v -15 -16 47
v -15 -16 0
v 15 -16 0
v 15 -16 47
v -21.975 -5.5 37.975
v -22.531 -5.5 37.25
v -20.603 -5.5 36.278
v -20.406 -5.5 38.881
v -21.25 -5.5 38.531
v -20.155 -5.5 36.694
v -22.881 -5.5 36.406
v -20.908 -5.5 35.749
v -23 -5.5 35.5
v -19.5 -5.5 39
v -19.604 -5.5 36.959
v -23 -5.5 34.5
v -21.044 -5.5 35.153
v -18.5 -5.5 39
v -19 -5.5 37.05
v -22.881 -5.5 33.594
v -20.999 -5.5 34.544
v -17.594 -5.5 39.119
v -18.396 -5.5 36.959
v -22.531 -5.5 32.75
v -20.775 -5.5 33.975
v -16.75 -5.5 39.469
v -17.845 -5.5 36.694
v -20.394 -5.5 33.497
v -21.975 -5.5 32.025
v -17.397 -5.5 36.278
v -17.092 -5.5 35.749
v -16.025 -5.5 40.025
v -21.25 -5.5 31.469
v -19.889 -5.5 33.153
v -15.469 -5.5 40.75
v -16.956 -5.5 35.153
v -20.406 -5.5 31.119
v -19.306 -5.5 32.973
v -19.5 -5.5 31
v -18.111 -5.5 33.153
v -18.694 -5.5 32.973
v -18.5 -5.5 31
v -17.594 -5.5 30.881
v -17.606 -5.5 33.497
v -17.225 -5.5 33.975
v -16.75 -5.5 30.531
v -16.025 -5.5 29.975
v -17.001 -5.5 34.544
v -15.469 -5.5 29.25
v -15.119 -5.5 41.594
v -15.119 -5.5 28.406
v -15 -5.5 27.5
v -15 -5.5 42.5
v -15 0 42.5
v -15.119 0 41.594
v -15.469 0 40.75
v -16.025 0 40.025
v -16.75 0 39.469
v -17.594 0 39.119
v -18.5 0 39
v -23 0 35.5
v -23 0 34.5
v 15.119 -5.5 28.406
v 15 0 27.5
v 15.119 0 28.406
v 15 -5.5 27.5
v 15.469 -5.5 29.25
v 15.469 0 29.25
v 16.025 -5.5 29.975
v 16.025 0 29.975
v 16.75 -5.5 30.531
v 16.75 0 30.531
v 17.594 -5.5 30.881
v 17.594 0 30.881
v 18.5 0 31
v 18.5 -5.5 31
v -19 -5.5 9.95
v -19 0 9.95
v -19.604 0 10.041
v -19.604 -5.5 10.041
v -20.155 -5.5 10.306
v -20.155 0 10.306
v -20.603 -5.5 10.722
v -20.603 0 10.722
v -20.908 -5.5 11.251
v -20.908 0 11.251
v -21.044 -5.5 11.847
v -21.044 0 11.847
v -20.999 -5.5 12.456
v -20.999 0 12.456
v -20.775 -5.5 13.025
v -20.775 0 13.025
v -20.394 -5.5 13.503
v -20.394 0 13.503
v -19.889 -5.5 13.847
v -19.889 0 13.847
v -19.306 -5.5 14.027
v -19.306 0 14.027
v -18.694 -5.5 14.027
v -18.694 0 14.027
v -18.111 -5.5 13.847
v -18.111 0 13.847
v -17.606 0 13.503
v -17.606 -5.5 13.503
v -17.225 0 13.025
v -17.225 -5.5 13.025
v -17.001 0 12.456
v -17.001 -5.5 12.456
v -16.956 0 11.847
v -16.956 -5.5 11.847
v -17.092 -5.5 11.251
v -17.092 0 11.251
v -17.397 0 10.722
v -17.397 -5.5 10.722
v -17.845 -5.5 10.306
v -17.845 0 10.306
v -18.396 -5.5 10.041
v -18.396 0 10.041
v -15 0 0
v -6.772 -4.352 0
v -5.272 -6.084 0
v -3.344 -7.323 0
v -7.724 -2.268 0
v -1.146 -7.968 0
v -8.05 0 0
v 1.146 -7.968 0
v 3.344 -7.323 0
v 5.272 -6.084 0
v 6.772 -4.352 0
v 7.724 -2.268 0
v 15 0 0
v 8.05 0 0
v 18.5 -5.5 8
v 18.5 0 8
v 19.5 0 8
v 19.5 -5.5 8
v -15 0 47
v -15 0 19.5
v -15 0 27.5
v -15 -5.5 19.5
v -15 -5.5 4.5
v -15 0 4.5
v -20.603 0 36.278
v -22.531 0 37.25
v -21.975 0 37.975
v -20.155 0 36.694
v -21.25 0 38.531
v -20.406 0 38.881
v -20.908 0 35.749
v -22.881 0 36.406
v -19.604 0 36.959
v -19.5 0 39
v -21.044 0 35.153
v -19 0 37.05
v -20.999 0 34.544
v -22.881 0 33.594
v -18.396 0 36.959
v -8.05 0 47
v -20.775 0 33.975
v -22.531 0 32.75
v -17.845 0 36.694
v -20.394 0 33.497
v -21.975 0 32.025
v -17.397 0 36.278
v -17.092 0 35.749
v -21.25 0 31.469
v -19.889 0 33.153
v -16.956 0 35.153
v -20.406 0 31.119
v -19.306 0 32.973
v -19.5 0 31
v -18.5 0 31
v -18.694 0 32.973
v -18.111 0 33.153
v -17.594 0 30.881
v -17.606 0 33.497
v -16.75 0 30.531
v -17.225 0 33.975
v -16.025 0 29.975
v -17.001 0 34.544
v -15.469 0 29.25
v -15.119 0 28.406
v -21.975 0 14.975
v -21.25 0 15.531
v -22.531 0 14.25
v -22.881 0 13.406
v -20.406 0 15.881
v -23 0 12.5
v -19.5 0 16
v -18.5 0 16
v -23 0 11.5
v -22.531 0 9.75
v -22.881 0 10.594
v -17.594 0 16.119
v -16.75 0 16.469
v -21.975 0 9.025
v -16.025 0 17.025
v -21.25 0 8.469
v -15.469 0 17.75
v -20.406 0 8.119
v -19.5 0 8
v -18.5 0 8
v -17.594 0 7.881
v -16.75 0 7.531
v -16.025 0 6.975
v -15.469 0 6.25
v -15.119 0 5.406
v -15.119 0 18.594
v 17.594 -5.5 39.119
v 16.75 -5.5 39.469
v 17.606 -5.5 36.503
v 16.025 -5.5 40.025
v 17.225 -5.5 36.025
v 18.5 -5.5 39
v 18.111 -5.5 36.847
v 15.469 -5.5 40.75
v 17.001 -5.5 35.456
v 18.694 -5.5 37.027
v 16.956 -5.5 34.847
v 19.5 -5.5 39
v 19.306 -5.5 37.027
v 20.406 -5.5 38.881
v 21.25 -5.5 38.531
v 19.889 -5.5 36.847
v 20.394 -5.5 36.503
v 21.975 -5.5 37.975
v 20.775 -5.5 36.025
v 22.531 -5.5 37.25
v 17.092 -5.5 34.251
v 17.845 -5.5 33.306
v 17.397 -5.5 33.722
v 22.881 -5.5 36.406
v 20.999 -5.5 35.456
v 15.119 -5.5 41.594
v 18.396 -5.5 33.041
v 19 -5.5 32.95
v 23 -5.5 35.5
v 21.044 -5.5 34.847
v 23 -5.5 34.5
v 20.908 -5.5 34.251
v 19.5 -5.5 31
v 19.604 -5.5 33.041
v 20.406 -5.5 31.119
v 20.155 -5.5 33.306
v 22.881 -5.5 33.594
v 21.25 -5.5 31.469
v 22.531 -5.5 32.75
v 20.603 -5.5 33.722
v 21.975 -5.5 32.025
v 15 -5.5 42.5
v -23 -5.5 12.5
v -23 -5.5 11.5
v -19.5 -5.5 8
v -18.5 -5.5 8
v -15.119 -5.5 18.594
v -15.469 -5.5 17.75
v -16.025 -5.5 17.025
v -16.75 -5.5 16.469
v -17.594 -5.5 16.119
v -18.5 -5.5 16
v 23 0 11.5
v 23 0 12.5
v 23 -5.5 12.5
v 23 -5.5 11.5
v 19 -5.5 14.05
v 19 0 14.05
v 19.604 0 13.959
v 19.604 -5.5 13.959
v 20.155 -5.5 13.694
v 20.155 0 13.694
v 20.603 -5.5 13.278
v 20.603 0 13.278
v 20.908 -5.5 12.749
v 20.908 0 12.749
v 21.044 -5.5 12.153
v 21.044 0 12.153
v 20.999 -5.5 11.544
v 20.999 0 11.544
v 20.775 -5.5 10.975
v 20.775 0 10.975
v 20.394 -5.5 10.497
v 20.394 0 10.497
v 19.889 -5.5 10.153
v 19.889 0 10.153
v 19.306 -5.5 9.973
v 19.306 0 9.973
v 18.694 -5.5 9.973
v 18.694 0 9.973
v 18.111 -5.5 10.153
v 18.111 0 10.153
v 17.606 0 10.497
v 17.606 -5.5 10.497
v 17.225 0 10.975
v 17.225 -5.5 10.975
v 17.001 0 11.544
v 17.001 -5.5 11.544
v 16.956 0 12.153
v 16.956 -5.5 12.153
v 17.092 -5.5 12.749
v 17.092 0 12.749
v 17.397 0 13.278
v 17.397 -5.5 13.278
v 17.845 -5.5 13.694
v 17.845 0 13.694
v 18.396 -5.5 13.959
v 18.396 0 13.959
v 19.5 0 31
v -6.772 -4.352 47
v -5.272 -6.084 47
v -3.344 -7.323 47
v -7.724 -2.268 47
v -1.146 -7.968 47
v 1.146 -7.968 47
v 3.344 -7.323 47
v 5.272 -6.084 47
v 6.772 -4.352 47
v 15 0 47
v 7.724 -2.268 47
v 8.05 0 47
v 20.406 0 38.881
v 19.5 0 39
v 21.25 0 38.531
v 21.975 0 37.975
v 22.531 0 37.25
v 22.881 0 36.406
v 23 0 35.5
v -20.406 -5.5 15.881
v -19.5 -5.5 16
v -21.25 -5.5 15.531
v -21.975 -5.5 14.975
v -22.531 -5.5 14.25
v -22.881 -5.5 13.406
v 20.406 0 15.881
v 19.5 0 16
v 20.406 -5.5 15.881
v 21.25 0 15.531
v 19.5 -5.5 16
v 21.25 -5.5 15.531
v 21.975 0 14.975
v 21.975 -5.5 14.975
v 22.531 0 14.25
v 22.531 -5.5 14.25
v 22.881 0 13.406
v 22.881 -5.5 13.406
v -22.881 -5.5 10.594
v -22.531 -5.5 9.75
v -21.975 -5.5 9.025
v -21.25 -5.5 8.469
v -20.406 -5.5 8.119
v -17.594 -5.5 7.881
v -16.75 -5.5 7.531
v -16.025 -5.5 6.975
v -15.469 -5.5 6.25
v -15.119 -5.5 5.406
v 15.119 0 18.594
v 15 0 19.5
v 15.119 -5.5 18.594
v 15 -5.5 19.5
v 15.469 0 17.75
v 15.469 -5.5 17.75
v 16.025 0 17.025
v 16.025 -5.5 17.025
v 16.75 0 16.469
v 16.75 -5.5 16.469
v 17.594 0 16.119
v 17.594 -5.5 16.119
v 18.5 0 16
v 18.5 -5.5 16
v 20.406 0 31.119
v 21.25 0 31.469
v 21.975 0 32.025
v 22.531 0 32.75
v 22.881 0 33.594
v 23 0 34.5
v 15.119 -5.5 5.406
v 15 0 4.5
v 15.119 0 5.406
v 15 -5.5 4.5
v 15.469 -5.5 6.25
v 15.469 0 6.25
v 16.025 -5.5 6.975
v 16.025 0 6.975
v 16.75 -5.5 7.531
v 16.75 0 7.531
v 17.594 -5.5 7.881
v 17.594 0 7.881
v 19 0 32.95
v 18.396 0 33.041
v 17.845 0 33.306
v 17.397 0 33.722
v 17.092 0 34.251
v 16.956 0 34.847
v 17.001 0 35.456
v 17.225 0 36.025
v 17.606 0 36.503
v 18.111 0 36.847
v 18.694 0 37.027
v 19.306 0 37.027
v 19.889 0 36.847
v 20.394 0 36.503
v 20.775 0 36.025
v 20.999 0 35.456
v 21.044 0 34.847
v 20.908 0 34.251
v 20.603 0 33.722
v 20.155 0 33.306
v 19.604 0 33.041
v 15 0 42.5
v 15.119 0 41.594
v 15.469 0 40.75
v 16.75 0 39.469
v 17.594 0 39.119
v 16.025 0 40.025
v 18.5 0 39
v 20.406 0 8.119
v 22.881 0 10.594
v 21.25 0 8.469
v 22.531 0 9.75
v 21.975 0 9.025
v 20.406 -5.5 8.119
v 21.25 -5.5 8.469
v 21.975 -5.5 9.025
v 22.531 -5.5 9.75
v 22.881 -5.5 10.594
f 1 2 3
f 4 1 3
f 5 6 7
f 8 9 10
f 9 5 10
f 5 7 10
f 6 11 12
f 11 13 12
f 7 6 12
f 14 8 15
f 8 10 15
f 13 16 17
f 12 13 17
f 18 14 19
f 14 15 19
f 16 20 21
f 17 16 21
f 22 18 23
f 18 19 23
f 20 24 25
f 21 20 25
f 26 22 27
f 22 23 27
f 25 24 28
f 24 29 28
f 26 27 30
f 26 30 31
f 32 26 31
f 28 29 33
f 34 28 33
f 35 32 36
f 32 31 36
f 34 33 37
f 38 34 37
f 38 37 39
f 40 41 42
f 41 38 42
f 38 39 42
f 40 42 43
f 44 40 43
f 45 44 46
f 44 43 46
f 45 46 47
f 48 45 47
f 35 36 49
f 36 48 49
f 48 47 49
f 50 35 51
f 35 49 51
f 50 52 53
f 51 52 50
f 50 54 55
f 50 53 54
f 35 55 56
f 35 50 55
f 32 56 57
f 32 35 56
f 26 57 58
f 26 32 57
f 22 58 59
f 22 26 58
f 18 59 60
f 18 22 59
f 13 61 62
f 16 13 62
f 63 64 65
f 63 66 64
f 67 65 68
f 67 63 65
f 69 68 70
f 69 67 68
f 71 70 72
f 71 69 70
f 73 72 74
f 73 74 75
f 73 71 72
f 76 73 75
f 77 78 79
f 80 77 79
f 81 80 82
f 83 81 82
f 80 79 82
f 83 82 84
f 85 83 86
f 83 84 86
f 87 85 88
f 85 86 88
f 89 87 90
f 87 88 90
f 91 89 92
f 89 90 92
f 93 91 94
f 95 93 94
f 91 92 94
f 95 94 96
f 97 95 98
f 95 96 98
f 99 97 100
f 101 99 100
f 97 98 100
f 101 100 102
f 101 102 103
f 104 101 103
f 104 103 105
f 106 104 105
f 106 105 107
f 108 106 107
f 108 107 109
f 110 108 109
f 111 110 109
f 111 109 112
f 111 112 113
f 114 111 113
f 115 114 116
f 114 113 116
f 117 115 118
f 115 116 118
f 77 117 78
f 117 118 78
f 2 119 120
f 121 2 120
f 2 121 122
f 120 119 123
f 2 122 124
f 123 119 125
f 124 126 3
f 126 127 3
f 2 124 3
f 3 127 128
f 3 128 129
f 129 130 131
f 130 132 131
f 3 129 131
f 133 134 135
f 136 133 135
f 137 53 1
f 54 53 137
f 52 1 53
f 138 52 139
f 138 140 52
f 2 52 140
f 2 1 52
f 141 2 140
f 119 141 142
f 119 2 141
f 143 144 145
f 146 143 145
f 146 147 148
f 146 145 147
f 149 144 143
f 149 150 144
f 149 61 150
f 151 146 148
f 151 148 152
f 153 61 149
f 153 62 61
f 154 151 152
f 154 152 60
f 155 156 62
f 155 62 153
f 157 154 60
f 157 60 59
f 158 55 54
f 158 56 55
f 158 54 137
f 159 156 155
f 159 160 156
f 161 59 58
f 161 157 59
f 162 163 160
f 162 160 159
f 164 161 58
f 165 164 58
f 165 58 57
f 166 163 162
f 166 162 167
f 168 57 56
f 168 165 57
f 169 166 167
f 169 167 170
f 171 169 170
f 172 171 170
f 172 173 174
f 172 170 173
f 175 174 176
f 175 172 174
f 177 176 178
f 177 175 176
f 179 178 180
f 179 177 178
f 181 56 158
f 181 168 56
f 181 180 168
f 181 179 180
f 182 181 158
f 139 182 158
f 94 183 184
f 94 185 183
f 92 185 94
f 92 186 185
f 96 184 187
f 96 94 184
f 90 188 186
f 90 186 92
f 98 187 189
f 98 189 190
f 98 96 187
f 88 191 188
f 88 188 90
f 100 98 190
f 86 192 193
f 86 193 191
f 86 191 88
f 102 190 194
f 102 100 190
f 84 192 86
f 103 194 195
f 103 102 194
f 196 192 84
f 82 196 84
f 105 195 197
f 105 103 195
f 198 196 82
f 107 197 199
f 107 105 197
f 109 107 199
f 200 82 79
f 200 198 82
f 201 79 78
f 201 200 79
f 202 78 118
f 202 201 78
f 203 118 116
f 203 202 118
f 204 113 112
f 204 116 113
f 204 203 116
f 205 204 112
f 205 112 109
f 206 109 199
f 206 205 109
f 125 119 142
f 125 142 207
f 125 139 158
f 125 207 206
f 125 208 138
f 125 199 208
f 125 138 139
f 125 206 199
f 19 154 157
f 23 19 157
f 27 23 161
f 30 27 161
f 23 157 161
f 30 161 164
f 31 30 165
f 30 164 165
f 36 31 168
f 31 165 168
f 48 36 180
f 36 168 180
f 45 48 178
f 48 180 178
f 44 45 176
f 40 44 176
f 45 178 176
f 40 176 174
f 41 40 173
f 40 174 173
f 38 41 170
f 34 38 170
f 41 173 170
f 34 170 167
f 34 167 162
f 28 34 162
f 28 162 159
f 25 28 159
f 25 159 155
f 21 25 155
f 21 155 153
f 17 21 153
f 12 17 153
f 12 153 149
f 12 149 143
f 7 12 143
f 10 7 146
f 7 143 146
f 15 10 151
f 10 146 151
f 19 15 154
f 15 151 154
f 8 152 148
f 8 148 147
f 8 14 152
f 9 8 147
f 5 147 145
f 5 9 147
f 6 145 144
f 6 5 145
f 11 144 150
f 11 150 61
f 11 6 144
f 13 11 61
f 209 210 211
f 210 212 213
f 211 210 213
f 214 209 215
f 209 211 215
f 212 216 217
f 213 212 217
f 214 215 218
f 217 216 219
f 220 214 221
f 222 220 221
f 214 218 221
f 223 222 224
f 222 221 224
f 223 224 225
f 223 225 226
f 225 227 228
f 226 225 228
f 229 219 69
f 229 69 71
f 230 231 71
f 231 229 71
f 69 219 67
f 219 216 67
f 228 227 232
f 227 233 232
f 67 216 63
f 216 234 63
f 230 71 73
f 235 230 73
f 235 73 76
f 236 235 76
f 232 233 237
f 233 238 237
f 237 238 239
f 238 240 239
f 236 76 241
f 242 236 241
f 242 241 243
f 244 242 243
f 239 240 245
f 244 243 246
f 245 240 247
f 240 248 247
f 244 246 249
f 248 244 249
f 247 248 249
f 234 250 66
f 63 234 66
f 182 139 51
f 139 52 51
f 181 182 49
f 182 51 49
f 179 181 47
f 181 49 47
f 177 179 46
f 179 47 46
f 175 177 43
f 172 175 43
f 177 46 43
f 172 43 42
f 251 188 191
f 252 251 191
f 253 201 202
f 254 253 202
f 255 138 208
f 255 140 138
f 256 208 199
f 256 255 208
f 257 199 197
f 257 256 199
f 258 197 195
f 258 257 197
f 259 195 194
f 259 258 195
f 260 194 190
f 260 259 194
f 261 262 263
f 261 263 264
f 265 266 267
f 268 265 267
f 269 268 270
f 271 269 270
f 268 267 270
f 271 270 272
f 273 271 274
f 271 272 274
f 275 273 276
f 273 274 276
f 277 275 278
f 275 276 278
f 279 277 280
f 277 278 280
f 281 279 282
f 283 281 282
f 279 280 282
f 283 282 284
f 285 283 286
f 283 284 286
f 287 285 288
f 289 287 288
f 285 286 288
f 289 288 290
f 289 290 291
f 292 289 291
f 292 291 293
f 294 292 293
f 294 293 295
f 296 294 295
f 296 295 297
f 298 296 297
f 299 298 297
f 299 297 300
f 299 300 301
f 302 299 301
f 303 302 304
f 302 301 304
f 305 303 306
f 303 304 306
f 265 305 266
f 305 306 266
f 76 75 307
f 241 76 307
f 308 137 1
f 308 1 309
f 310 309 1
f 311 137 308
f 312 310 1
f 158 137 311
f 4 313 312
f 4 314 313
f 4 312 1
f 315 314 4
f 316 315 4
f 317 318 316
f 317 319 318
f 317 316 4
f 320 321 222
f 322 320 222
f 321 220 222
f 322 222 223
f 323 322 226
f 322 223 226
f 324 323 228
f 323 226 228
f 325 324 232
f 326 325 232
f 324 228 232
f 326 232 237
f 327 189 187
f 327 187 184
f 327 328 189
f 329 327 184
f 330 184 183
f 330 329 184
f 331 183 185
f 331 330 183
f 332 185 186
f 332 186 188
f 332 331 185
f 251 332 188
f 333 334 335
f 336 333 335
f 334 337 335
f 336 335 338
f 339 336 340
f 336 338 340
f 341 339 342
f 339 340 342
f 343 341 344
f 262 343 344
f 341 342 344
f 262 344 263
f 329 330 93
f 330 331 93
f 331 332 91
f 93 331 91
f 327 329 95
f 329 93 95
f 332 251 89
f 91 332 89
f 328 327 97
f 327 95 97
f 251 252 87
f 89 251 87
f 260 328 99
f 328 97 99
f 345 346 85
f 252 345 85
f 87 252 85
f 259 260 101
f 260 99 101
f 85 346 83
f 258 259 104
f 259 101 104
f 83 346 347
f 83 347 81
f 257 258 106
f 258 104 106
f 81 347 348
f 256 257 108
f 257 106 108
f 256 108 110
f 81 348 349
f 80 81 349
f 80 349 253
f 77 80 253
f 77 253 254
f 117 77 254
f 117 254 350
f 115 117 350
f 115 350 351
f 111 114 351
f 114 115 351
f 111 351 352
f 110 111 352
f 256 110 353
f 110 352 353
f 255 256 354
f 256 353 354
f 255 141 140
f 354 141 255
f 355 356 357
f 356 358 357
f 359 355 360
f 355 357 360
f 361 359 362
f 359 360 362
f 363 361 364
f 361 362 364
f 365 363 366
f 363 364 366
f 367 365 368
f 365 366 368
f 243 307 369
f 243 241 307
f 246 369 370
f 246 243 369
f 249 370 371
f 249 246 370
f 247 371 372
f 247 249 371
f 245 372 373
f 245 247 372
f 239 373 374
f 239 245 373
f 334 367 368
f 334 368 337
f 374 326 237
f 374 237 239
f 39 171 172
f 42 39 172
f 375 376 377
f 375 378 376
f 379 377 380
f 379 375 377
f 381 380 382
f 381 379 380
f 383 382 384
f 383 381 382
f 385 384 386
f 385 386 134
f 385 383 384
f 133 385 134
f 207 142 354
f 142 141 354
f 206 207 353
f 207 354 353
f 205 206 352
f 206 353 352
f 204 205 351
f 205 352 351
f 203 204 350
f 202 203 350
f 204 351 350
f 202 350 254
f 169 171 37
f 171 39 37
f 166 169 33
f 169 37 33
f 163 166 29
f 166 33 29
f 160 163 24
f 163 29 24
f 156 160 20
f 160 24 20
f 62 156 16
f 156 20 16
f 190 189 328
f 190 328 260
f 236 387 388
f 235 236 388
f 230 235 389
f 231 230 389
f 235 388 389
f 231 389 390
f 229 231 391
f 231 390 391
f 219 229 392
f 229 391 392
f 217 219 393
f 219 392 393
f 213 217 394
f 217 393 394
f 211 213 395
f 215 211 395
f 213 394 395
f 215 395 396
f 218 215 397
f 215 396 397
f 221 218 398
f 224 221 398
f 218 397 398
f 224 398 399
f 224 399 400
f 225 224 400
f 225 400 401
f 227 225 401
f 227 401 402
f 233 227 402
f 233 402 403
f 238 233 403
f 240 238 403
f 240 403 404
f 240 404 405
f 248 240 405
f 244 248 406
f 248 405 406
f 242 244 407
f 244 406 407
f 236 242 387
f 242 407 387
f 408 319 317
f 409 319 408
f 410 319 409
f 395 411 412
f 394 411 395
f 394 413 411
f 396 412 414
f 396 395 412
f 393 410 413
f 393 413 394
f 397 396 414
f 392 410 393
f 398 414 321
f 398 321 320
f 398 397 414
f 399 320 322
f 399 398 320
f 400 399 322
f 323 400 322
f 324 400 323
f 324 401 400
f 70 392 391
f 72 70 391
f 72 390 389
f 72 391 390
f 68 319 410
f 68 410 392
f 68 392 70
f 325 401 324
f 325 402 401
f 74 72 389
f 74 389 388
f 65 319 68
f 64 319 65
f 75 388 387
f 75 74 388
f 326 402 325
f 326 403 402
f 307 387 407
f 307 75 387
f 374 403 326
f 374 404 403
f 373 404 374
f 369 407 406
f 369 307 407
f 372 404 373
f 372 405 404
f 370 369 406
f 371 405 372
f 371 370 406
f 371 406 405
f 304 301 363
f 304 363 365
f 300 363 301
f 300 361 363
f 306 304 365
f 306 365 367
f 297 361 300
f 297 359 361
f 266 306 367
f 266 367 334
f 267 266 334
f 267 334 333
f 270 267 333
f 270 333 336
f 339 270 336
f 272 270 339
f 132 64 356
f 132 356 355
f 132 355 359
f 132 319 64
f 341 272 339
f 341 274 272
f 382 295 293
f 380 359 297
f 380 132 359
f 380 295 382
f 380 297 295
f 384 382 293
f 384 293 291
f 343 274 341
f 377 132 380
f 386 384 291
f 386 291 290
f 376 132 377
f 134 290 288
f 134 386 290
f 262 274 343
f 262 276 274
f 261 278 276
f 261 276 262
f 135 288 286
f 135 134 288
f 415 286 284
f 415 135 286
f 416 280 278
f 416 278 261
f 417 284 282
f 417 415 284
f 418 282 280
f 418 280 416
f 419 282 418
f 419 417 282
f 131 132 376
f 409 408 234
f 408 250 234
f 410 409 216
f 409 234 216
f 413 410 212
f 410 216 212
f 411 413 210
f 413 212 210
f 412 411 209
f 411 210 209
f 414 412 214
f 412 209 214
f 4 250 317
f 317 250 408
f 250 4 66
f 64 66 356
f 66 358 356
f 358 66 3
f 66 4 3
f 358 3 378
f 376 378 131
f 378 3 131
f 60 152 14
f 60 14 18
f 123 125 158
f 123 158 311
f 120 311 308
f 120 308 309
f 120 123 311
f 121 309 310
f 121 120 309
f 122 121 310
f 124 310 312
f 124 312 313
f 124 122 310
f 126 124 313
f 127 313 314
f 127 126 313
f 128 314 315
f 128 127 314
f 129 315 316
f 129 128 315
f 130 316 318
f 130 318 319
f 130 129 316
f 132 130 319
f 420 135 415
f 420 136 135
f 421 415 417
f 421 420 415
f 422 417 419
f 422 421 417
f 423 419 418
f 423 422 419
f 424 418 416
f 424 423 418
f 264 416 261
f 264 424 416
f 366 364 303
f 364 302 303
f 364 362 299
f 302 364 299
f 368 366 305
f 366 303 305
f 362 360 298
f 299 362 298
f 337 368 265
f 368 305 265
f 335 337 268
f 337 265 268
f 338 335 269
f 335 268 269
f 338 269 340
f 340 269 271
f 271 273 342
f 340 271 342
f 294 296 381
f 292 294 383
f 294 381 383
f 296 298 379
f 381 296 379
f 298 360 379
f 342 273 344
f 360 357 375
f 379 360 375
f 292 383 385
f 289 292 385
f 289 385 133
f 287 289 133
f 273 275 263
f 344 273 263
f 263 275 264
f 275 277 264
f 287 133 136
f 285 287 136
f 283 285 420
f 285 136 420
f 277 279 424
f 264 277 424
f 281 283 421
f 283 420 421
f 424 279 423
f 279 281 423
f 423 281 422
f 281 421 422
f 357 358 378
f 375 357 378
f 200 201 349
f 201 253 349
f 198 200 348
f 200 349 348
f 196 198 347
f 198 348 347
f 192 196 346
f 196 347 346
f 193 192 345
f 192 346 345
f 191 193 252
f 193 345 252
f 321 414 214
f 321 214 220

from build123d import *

# Parameters (mm, degrees)
SKETCH1_W               = 30
SKETCH1_H               = 32
SKETCH1_R               = 8.05
BOSS_EXTRUDE1_DEPTH     = 47
CUT_EXTRUDE1_DEPTH      = 52.86520992
CUT_EXTRUDE1_DEPTH_BACK = 52.86520992
SKETCH3_W               = 30
SKETCH3_H               = 16
SKETCH4_W               = 8
SKETCH4_H               = 8
SKETCH4_R               = 2.05
BOSS_EXTRUDE2_DEPTH     = 5.5
FILLET1_R               = 3.5


with BuildPart() as part:
    # Sketch1 → Boss-Extrude1 (new body)
    with BuildSketch(Plane.XY):
        Rectangle(SKETCH1_W, SKETCH1_H)
        Circle(SKETCH1_R, mode=Mode.SUBTRACT)
    extrude(amount=BOSS_EXTRUDE1_DEPTH)

    # Sketch3 → Cut-Extrude1 (cut, two sides: drawn at the far end of the back side and taken through both)
    with BuildSketch(Plane.XY.offset(-CUT_EXTRUDE1_DEPTH_BACK)):
        with Locations((0, 8)):
            Rectangle(SKETCH3_W, SKETCH3_H)
    extrude(amount=CUT_EXTRUDE1_DEPTH + CUT_EXTRUDE1_DEPTH_BACK, mode=Mode.SUBTRACT)

    # Sketch4 → Boss-Extrude2 (add)
    # profile 1 of 4: a face of its own
    with BuildSketch(Plane(origin=(0, 0, 0), x_dir=(1, 0, 0), z_dir=(0, 1, 0))):
        with Locations((19, -12)):
            Rectangle(SKETCH4_W, SKETCH4_H)
        with Locations(Location((19, -12, 0), (0, 0, 270))):
            Circle(SKETCH4_R, mode=Mode.SUBTRACT)
    # profile 2 of 4: a face of its own
    with BuildSketch(Plane(origin=(0, 0, 0), x_dir=(1, 0, 0), z_dir=(0, 1, 0))):
        with Locations((-19, -35)):
            Rectangle(SKETCH4_W, SKETCH4_H)
        with Locations(Location((-19, -35, 0), (0, 0, 270))):
            Circle(SKETCH4_R, mode=Mode.SUBTRACT)
    # profile 3 of 4: a face of its own
    with BuildSketch(Plane(origin=(0, 0, 0), x_dir=(1, 0, 0), z_dir=(0, 1, 0))):
        with Locations((19, -35)):
            Rectangle(SKETCH4_W, SKETCH4_H)
        with Locations(Location((19, -35, 0), (0, 0, 90))):
            Circle(SKETCH4_R, mode=Mode.SUBTRACT)
    # profile 4 of 4: a face of its own
    with BuildSketch(Plane(origin=(0, 0, 0), x_dir=(1, 0, 0), z_dir=(0, 1, 0))):
        with Locations((-19, -12)):
            Rectangle(SKETCH4_W, SKETCH4_H)
        with Locations(Location((-19, -12, 0), (0, 0, 90))):
            Circle(SKETCH4_R, mode=Mode.SUBTRACT)
    extrude(amount=-BOSS_EXTRUDE2_DEPTH)

    # Fillet1
    fillet1_edges = [part.edges().sort_by_distance(p)[0] for p in [
        (-23, -2.75, 8),
        (-15, -2.75, 8),
        (-15, -2.75, 16),
        (-23, -2.75, 16),
        (23, -2.75, 39),
        (15, -2.75, 39),
        (15, -2.75, 31),
        (23, -2.75, 31),
        (-15, -2.75, 31),
        (-15, -2.75, 39),
        (-23, -2.75, 39),
        (-23, -2.75, 31),
        (15, -2.75, 16),
        (15, -2.75, 8),
        (23, -2.75, 8),
        (23, -2.75, 16),
    ]]
    fillet(fillet1_edges, radius=FILLET1_R)


solid = part.part
